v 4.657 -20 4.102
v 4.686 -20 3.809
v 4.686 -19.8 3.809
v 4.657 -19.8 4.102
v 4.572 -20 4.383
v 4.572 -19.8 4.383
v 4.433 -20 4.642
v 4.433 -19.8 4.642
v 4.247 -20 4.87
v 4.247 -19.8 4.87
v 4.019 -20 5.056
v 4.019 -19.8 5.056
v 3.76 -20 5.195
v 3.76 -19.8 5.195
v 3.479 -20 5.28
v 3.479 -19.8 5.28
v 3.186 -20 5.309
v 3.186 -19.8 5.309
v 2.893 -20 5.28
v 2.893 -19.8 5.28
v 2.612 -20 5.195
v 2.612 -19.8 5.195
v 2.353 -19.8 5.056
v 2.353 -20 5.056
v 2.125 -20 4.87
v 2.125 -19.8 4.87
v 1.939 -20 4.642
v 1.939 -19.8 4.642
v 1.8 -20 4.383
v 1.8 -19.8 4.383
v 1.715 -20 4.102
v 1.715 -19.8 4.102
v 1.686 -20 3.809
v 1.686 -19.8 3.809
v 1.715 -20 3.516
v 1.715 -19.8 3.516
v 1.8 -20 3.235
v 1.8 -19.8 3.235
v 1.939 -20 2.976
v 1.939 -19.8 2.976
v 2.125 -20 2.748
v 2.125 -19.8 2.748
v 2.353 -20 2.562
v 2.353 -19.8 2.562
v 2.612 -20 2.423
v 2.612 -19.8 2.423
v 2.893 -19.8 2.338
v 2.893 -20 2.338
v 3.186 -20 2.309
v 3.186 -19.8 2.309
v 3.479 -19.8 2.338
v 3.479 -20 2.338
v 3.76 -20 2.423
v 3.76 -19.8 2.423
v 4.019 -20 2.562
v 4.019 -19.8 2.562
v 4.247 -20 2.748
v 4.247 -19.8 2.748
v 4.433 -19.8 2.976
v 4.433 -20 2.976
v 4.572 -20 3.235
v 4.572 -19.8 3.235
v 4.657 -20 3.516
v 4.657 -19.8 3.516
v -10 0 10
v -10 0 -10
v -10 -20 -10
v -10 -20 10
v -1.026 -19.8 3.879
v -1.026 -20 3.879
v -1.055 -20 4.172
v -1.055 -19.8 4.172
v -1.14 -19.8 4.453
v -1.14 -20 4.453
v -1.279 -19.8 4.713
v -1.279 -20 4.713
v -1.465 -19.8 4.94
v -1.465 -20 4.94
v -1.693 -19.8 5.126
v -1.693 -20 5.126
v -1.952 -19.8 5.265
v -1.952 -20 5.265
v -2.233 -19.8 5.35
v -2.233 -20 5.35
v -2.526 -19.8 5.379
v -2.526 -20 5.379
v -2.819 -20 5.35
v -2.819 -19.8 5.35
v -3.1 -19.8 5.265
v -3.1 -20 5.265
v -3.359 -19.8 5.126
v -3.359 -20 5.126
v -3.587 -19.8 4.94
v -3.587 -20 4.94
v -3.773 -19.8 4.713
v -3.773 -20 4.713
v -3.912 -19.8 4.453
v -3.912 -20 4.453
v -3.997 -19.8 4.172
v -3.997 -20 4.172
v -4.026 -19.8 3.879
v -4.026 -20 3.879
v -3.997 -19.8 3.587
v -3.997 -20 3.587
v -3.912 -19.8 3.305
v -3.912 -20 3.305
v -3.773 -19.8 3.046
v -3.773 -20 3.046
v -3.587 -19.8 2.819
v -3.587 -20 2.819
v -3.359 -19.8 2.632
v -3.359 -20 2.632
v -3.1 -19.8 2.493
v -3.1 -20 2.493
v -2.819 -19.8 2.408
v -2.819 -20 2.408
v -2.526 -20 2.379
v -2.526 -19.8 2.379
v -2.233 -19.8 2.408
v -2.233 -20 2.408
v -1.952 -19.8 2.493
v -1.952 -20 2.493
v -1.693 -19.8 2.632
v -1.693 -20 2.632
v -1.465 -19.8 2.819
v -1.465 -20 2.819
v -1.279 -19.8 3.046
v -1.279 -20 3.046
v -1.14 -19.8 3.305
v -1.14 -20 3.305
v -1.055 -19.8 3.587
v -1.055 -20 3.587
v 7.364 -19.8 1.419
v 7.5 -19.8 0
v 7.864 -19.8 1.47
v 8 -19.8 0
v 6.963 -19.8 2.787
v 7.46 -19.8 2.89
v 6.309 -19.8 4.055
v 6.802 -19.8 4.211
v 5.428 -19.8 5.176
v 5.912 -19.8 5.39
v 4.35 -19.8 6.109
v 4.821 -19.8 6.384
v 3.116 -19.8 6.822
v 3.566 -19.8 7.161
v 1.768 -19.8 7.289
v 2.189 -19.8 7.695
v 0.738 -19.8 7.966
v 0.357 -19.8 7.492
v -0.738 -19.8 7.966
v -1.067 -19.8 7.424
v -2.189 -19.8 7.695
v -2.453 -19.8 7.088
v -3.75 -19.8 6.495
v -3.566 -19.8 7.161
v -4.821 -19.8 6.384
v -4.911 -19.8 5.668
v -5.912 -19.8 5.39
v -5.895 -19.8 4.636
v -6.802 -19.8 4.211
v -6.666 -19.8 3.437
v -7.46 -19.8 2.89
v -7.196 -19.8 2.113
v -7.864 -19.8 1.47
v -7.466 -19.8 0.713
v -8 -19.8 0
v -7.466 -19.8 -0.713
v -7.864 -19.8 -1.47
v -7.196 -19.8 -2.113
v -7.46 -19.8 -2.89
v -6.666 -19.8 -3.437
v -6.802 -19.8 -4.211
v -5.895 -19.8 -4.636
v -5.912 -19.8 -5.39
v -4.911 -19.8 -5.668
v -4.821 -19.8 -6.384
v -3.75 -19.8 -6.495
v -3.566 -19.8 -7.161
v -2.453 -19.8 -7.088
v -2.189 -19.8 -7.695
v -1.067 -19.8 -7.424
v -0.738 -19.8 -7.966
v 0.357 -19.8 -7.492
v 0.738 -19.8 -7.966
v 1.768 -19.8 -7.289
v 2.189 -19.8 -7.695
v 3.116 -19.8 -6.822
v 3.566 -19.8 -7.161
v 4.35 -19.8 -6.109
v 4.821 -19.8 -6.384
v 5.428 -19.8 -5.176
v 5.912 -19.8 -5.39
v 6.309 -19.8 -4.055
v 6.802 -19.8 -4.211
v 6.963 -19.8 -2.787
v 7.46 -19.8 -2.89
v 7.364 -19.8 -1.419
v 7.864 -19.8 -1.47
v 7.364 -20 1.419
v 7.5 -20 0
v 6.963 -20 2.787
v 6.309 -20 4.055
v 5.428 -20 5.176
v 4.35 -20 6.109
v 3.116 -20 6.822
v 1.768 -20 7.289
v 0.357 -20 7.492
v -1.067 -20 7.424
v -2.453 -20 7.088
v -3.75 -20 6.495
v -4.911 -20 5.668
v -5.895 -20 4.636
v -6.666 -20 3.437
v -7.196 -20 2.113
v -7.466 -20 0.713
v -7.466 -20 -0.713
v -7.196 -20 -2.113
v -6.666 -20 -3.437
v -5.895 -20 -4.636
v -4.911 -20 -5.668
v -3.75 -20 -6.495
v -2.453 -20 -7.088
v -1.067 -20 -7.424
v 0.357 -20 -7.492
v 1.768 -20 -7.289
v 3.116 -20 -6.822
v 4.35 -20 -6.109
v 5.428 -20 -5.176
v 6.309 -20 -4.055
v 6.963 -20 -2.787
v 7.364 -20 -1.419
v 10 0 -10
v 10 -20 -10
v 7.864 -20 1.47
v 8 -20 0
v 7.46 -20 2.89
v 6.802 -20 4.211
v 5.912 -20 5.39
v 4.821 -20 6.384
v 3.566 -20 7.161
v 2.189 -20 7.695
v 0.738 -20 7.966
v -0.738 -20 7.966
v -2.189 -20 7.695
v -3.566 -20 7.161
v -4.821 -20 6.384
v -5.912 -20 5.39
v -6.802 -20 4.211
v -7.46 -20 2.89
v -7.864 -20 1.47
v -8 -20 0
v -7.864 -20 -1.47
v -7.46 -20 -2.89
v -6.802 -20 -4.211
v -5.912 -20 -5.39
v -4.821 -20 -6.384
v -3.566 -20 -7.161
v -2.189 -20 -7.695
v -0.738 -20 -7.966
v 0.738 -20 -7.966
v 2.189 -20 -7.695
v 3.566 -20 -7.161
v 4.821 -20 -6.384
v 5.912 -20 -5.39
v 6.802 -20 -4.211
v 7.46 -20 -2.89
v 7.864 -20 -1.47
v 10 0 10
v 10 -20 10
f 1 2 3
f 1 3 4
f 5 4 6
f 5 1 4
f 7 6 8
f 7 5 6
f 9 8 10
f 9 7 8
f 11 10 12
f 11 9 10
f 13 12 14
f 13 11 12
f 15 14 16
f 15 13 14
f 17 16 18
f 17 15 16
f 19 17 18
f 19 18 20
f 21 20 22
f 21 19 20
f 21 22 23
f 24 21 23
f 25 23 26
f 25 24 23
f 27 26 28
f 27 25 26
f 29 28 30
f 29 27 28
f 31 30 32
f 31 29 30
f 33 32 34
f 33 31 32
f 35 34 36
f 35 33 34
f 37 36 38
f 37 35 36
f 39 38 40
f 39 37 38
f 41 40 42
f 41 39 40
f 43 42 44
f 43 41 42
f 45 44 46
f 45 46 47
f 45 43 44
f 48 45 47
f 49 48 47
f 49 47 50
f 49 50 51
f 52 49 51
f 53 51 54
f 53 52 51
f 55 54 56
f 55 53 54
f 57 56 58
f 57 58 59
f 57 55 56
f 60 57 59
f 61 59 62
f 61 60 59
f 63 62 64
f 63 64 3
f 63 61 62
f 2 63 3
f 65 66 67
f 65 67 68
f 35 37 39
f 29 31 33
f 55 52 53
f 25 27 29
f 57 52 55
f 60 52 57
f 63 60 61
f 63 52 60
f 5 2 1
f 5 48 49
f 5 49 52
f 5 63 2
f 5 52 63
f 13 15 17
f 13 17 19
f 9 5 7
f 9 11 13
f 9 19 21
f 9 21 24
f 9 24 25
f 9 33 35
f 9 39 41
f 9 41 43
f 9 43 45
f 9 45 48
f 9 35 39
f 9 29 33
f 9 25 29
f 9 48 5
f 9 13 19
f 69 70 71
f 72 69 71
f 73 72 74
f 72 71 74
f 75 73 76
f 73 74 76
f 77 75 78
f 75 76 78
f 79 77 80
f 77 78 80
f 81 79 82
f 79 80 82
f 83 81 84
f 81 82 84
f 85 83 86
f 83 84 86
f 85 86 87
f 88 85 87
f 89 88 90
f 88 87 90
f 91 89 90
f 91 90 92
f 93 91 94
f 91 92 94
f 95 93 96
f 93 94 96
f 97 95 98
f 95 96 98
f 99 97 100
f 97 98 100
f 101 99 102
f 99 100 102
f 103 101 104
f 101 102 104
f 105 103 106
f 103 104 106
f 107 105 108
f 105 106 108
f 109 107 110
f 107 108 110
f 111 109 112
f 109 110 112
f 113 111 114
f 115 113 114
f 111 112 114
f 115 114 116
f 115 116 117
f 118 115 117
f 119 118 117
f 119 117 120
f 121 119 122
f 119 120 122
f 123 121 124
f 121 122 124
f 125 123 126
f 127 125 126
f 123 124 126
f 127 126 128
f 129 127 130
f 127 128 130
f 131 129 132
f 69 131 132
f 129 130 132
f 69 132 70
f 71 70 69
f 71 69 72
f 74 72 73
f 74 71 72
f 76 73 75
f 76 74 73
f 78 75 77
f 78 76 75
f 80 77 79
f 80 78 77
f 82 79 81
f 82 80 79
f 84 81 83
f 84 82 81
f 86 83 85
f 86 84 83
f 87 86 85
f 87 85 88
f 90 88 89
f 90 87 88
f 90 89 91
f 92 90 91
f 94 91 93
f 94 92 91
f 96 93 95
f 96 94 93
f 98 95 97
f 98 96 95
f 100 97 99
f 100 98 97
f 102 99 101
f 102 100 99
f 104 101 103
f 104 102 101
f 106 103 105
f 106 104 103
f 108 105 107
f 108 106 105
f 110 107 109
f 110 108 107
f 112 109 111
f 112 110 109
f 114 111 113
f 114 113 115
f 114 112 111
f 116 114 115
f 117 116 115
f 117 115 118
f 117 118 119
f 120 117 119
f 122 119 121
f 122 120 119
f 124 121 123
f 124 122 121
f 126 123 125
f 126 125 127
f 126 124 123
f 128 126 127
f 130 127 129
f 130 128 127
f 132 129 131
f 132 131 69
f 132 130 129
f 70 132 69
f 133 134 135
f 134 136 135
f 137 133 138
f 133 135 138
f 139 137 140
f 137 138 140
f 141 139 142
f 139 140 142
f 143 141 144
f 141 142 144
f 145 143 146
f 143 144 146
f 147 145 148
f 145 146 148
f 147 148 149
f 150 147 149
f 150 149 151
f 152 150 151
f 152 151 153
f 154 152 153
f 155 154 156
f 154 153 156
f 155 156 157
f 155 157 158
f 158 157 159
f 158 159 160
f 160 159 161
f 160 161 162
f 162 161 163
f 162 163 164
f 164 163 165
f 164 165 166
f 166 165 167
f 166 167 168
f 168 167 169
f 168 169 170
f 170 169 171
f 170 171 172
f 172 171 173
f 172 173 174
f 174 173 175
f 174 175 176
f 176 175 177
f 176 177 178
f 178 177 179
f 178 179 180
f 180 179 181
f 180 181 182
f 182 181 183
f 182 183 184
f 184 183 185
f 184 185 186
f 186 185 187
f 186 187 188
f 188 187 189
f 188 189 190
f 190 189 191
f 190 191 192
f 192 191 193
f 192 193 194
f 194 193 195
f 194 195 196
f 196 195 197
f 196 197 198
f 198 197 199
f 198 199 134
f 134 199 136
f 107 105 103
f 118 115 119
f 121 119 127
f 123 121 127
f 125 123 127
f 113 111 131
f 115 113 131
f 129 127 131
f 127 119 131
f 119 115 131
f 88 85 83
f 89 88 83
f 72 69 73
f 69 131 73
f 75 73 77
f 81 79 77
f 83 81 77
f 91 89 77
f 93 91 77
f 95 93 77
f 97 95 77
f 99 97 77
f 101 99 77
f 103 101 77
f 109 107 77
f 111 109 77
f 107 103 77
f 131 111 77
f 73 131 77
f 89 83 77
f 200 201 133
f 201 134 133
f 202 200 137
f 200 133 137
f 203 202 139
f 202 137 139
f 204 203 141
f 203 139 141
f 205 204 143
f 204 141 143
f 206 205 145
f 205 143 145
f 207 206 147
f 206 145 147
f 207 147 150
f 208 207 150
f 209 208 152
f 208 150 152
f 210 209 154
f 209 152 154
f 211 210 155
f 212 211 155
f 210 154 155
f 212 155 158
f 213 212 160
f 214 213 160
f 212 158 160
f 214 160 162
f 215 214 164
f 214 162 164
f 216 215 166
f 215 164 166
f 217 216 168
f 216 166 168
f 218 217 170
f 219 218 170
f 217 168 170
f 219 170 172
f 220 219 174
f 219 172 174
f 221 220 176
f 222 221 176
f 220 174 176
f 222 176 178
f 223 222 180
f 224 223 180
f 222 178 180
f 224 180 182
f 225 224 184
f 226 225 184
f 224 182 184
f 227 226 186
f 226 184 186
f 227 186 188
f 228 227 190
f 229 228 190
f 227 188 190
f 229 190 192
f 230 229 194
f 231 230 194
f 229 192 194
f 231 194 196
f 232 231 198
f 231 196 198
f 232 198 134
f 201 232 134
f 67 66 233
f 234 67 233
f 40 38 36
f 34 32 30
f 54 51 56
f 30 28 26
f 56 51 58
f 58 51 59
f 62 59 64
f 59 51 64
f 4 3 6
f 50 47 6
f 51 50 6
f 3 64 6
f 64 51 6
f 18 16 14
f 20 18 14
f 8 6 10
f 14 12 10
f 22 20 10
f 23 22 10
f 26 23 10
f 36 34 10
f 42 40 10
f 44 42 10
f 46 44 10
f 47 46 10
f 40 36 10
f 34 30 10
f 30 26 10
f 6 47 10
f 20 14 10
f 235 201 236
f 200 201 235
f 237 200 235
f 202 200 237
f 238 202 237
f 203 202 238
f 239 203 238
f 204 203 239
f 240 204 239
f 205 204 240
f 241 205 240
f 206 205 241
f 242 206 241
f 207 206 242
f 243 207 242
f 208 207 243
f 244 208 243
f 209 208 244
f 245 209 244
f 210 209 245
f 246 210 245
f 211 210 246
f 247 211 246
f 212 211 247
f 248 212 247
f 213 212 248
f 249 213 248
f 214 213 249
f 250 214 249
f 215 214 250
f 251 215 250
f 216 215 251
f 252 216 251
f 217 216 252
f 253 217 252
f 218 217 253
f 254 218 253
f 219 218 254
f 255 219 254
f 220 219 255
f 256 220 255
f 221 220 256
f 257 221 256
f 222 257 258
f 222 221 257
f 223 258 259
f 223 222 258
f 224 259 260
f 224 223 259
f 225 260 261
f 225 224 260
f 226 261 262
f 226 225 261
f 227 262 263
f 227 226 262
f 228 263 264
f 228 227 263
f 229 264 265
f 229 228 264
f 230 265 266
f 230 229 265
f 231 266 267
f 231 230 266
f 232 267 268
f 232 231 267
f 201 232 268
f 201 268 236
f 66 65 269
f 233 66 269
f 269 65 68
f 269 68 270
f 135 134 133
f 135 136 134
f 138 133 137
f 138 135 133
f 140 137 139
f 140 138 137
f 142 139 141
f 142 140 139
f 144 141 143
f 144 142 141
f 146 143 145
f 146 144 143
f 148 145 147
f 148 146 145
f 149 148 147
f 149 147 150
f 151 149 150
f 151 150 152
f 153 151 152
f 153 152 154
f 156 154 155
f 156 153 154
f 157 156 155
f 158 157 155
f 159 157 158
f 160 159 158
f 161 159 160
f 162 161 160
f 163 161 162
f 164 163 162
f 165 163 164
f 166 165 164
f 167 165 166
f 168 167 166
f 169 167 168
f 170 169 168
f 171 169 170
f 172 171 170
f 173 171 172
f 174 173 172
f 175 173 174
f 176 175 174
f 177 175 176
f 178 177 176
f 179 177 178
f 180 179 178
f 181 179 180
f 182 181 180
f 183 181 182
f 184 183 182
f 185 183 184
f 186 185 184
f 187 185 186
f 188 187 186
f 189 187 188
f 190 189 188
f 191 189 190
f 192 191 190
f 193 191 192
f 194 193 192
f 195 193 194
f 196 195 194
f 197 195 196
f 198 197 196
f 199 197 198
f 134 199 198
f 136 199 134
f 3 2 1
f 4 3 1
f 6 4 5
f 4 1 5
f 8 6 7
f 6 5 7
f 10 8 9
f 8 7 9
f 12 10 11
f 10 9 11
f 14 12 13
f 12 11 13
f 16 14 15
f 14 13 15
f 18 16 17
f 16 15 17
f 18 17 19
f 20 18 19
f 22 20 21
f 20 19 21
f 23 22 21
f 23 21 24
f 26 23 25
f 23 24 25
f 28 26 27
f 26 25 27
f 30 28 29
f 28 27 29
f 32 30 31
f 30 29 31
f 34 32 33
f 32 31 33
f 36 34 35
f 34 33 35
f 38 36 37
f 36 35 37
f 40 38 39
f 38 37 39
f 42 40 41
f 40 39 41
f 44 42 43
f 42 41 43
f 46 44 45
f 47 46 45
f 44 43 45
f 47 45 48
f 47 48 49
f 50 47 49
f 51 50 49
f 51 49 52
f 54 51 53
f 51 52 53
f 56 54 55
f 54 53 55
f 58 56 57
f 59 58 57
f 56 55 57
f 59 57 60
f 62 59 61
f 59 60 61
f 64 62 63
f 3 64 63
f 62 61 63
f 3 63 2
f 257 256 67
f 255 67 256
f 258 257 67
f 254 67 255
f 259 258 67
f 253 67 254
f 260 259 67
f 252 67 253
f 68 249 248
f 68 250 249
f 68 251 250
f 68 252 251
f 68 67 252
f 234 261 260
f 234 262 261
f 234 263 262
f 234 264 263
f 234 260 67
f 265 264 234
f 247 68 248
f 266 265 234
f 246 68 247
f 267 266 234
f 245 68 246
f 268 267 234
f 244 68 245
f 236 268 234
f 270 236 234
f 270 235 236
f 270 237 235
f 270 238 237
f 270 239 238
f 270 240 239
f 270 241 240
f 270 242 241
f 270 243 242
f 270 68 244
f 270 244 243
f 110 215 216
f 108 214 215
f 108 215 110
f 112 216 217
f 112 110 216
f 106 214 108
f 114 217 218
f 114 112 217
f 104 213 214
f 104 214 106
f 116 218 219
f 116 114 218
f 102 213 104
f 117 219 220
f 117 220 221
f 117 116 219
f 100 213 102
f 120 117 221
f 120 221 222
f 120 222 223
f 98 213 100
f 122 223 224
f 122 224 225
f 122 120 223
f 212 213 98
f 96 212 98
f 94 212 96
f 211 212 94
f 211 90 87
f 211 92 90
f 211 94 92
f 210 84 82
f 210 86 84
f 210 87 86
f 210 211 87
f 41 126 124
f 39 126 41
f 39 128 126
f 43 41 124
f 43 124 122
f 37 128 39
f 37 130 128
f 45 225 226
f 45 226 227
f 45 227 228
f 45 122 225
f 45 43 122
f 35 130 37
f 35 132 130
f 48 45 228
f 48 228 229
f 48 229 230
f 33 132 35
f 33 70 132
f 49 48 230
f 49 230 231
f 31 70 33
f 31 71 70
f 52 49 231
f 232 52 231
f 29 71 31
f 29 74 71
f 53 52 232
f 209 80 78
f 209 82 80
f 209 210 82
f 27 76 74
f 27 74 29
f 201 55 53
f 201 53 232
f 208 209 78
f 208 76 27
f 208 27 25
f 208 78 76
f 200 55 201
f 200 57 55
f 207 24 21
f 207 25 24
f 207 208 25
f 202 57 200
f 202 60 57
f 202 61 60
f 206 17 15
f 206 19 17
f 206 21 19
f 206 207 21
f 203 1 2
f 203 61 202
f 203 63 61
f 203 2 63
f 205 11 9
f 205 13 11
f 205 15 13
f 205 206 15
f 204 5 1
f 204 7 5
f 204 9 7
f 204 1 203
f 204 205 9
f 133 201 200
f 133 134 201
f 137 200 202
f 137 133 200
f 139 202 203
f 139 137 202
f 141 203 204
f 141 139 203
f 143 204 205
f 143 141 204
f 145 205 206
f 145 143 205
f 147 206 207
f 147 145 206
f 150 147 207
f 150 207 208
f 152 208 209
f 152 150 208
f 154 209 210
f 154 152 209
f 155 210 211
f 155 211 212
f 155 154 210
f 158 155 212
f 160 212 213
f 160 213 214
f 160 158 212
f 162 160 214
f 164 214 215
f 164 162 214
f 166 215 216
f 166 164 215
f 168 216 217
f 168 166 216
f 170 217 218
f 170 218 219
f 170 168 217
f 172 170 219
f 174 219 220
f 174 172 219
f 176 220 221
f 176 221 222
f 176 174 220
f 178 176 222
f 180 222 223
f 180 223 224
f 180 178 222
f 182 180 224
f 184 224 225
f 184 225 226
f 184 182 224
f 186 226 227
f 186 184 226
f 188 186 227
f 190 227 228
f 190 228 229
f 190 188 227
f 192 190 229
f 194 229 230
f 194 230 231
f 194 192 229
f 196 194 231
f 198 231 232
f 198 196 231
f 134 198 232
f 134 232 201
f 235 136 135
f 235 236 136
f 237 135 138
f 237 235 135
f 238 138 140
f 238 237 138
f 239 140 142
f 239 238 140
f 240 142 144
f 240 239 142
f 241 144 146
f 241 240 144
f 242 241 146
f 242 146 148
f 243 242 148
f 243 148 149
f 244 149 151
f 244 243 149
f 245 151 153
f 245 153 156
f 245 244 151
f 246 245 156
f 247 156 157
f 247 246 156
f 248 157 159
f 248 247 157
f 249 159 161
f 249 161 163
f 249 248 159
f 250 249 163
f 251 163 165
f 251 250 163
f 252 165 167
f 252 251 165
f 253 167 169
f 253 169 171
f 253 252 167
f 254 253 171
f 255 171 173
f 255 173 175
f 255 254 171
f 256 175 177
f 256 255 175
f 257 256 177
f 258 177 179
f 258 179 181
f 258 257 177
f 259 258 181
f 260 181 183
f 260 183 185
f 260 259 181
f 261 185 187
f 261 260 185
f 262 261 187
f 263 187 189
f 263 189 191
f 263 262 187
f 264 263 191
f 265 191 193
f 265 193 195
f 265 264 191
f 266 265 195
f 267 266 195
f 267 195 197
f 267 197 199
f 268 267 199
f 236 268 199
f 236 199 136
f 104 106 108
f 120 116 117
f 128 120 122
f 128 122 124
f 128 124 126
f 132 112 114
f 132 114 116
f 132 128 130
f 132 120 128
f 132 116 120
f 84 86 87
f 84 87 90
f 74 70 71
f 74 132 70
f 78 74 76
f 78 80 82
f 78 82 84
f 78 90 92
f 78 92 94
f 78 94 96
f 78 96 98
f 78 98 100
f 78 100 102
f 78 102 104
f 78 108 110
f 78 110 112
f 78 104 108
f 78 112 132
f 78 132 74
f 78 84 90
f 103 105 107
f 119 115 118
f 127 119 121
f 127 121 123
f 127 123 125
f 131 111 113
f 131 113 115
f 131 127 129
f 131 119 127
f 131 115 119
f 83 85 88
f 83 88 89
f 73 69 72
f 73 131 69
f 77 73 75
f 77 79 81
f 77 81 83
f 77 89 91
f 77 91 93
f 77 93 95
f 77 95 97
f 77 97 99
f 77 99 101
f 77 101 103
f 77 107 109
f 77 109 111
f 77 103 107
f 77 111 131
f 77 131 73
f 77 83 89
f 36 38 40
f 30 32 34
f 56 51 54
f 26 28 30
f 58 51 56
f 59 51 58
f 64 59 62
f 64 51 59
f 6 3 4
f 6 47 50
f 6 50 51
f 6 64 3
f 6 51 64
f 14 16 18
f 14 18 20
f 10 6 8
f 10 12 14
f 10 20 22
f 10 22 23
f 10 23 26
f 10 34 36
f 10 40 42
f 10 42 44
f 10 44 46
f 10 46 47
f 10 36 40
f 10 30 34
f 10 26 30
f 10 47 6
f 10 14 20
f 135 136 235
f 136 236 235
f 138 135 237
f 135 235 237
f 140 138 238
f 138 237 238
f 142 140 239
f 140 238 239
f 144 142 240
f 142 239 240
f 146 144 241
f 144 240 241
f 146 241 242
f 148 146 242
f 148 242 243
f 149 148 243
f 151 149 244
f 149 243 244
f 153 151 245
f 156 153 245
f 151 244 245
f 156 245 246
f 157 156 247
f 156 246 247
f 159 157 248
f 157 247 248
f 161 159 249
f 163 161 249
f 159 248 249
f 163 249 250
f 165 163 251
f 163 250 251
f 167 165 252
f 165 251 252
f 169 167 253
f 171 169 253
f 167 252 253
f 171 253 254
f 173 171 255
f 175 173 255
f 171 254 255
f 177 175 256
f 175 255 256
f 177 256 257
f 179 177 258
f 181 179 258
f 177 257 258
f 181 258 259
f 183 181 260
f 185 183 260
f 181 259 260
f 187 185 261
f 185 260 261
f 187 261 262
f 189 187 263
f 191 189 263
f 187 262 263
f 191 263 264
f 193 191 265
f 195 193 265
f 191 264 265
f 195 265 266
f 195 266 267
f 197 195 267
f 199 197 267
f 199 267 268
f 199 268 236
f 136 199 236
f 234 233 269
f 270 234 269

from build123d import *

# Parameters (mm, degrees)
F0_W     = 20
F0_H     = 20
F1_DEPTH = 20
F4_W     = 0.5
F4_H     = 0.2
F7_R     = 1.5
F8_DEPTH = 0.2
F9_DEPTH = 0.2


with BuildPart() as f1:
    # F0 (on Front) → F1 (new body)
    with BuildSketch(Plane.XZ):
        Rectangle(F0_W, F0_H)
    extrude(amount=F1_DEPTH)

    # F6: sweep along a path in F2
    with BuildLine(Plane.XZ.offset(20)) as f6_path:
        CenterArc((0, 0), 8, 0, 360)
    # F4 (on 3pt) → F6 (sweep, cut)
    with BuildSketch(Plane(origin=(0, 0, 0), x_dir=(1, 0, 0), z_dir=(0, 0, -1))):
        with Locations((7.75, 19.9)):
            Rectangle(F4_W, F4_H)
    sweep(path=f6_path.line, mode=Mode.SUBTRACT)

    # F7 (on face) → F8 (cut)
    with BuildSketch(Plane.XZ.offset(20)):
        with Locations((3.1861089783, 3.8091301957)):
            Circle(F7_R)
        with Locations((-2.5258816751, 3.8792855246)):
            Circle(F7_R)
    extrude(amount=-F8_DEPTH, mode=Mode.SUBTRACT)


with BuildPart() as f5:
    # F5: sweep along a path in F2
    with BuildLine(Plane.XZ.offset(20)) as f5_path:
        CenterArc((0, 0), 8, 0, 360)
    # F4 (on 3pt) → F5 (sweep)
    with BuildSketch(Plane(origin=(0, 0, 0), x_dir=(1, 0, 0), z_dir=(0, 0, -1))):
        with Locations((7.75, 19.9)):
            Rectangle(F4_W, F4_H)
    sweep(path=f5_path.line)


with BuildPart() as f9:
    # F7 (on face) → F9 (new body)
    with BuildSketch(Plane.XZ.offset(20)):
        with Locations((-2.5258816751, 3.8792855246)):
            Circle(F7_R)
    extrude(amount=-F9_DEPTH)


with BuildPart() as f9b:
    # F7 (on face) → F9, piece 2 (new body)
    with BuildSketch(Plane.XZ.offset(20)):
        with Locations((3.1861089783, 3.8091301957)):
            Circle(F7_R)
    extrude(amount=-F9_DEPTH)


solid = Compound([f1.part, f5.part, f9.part, f9b.part])
